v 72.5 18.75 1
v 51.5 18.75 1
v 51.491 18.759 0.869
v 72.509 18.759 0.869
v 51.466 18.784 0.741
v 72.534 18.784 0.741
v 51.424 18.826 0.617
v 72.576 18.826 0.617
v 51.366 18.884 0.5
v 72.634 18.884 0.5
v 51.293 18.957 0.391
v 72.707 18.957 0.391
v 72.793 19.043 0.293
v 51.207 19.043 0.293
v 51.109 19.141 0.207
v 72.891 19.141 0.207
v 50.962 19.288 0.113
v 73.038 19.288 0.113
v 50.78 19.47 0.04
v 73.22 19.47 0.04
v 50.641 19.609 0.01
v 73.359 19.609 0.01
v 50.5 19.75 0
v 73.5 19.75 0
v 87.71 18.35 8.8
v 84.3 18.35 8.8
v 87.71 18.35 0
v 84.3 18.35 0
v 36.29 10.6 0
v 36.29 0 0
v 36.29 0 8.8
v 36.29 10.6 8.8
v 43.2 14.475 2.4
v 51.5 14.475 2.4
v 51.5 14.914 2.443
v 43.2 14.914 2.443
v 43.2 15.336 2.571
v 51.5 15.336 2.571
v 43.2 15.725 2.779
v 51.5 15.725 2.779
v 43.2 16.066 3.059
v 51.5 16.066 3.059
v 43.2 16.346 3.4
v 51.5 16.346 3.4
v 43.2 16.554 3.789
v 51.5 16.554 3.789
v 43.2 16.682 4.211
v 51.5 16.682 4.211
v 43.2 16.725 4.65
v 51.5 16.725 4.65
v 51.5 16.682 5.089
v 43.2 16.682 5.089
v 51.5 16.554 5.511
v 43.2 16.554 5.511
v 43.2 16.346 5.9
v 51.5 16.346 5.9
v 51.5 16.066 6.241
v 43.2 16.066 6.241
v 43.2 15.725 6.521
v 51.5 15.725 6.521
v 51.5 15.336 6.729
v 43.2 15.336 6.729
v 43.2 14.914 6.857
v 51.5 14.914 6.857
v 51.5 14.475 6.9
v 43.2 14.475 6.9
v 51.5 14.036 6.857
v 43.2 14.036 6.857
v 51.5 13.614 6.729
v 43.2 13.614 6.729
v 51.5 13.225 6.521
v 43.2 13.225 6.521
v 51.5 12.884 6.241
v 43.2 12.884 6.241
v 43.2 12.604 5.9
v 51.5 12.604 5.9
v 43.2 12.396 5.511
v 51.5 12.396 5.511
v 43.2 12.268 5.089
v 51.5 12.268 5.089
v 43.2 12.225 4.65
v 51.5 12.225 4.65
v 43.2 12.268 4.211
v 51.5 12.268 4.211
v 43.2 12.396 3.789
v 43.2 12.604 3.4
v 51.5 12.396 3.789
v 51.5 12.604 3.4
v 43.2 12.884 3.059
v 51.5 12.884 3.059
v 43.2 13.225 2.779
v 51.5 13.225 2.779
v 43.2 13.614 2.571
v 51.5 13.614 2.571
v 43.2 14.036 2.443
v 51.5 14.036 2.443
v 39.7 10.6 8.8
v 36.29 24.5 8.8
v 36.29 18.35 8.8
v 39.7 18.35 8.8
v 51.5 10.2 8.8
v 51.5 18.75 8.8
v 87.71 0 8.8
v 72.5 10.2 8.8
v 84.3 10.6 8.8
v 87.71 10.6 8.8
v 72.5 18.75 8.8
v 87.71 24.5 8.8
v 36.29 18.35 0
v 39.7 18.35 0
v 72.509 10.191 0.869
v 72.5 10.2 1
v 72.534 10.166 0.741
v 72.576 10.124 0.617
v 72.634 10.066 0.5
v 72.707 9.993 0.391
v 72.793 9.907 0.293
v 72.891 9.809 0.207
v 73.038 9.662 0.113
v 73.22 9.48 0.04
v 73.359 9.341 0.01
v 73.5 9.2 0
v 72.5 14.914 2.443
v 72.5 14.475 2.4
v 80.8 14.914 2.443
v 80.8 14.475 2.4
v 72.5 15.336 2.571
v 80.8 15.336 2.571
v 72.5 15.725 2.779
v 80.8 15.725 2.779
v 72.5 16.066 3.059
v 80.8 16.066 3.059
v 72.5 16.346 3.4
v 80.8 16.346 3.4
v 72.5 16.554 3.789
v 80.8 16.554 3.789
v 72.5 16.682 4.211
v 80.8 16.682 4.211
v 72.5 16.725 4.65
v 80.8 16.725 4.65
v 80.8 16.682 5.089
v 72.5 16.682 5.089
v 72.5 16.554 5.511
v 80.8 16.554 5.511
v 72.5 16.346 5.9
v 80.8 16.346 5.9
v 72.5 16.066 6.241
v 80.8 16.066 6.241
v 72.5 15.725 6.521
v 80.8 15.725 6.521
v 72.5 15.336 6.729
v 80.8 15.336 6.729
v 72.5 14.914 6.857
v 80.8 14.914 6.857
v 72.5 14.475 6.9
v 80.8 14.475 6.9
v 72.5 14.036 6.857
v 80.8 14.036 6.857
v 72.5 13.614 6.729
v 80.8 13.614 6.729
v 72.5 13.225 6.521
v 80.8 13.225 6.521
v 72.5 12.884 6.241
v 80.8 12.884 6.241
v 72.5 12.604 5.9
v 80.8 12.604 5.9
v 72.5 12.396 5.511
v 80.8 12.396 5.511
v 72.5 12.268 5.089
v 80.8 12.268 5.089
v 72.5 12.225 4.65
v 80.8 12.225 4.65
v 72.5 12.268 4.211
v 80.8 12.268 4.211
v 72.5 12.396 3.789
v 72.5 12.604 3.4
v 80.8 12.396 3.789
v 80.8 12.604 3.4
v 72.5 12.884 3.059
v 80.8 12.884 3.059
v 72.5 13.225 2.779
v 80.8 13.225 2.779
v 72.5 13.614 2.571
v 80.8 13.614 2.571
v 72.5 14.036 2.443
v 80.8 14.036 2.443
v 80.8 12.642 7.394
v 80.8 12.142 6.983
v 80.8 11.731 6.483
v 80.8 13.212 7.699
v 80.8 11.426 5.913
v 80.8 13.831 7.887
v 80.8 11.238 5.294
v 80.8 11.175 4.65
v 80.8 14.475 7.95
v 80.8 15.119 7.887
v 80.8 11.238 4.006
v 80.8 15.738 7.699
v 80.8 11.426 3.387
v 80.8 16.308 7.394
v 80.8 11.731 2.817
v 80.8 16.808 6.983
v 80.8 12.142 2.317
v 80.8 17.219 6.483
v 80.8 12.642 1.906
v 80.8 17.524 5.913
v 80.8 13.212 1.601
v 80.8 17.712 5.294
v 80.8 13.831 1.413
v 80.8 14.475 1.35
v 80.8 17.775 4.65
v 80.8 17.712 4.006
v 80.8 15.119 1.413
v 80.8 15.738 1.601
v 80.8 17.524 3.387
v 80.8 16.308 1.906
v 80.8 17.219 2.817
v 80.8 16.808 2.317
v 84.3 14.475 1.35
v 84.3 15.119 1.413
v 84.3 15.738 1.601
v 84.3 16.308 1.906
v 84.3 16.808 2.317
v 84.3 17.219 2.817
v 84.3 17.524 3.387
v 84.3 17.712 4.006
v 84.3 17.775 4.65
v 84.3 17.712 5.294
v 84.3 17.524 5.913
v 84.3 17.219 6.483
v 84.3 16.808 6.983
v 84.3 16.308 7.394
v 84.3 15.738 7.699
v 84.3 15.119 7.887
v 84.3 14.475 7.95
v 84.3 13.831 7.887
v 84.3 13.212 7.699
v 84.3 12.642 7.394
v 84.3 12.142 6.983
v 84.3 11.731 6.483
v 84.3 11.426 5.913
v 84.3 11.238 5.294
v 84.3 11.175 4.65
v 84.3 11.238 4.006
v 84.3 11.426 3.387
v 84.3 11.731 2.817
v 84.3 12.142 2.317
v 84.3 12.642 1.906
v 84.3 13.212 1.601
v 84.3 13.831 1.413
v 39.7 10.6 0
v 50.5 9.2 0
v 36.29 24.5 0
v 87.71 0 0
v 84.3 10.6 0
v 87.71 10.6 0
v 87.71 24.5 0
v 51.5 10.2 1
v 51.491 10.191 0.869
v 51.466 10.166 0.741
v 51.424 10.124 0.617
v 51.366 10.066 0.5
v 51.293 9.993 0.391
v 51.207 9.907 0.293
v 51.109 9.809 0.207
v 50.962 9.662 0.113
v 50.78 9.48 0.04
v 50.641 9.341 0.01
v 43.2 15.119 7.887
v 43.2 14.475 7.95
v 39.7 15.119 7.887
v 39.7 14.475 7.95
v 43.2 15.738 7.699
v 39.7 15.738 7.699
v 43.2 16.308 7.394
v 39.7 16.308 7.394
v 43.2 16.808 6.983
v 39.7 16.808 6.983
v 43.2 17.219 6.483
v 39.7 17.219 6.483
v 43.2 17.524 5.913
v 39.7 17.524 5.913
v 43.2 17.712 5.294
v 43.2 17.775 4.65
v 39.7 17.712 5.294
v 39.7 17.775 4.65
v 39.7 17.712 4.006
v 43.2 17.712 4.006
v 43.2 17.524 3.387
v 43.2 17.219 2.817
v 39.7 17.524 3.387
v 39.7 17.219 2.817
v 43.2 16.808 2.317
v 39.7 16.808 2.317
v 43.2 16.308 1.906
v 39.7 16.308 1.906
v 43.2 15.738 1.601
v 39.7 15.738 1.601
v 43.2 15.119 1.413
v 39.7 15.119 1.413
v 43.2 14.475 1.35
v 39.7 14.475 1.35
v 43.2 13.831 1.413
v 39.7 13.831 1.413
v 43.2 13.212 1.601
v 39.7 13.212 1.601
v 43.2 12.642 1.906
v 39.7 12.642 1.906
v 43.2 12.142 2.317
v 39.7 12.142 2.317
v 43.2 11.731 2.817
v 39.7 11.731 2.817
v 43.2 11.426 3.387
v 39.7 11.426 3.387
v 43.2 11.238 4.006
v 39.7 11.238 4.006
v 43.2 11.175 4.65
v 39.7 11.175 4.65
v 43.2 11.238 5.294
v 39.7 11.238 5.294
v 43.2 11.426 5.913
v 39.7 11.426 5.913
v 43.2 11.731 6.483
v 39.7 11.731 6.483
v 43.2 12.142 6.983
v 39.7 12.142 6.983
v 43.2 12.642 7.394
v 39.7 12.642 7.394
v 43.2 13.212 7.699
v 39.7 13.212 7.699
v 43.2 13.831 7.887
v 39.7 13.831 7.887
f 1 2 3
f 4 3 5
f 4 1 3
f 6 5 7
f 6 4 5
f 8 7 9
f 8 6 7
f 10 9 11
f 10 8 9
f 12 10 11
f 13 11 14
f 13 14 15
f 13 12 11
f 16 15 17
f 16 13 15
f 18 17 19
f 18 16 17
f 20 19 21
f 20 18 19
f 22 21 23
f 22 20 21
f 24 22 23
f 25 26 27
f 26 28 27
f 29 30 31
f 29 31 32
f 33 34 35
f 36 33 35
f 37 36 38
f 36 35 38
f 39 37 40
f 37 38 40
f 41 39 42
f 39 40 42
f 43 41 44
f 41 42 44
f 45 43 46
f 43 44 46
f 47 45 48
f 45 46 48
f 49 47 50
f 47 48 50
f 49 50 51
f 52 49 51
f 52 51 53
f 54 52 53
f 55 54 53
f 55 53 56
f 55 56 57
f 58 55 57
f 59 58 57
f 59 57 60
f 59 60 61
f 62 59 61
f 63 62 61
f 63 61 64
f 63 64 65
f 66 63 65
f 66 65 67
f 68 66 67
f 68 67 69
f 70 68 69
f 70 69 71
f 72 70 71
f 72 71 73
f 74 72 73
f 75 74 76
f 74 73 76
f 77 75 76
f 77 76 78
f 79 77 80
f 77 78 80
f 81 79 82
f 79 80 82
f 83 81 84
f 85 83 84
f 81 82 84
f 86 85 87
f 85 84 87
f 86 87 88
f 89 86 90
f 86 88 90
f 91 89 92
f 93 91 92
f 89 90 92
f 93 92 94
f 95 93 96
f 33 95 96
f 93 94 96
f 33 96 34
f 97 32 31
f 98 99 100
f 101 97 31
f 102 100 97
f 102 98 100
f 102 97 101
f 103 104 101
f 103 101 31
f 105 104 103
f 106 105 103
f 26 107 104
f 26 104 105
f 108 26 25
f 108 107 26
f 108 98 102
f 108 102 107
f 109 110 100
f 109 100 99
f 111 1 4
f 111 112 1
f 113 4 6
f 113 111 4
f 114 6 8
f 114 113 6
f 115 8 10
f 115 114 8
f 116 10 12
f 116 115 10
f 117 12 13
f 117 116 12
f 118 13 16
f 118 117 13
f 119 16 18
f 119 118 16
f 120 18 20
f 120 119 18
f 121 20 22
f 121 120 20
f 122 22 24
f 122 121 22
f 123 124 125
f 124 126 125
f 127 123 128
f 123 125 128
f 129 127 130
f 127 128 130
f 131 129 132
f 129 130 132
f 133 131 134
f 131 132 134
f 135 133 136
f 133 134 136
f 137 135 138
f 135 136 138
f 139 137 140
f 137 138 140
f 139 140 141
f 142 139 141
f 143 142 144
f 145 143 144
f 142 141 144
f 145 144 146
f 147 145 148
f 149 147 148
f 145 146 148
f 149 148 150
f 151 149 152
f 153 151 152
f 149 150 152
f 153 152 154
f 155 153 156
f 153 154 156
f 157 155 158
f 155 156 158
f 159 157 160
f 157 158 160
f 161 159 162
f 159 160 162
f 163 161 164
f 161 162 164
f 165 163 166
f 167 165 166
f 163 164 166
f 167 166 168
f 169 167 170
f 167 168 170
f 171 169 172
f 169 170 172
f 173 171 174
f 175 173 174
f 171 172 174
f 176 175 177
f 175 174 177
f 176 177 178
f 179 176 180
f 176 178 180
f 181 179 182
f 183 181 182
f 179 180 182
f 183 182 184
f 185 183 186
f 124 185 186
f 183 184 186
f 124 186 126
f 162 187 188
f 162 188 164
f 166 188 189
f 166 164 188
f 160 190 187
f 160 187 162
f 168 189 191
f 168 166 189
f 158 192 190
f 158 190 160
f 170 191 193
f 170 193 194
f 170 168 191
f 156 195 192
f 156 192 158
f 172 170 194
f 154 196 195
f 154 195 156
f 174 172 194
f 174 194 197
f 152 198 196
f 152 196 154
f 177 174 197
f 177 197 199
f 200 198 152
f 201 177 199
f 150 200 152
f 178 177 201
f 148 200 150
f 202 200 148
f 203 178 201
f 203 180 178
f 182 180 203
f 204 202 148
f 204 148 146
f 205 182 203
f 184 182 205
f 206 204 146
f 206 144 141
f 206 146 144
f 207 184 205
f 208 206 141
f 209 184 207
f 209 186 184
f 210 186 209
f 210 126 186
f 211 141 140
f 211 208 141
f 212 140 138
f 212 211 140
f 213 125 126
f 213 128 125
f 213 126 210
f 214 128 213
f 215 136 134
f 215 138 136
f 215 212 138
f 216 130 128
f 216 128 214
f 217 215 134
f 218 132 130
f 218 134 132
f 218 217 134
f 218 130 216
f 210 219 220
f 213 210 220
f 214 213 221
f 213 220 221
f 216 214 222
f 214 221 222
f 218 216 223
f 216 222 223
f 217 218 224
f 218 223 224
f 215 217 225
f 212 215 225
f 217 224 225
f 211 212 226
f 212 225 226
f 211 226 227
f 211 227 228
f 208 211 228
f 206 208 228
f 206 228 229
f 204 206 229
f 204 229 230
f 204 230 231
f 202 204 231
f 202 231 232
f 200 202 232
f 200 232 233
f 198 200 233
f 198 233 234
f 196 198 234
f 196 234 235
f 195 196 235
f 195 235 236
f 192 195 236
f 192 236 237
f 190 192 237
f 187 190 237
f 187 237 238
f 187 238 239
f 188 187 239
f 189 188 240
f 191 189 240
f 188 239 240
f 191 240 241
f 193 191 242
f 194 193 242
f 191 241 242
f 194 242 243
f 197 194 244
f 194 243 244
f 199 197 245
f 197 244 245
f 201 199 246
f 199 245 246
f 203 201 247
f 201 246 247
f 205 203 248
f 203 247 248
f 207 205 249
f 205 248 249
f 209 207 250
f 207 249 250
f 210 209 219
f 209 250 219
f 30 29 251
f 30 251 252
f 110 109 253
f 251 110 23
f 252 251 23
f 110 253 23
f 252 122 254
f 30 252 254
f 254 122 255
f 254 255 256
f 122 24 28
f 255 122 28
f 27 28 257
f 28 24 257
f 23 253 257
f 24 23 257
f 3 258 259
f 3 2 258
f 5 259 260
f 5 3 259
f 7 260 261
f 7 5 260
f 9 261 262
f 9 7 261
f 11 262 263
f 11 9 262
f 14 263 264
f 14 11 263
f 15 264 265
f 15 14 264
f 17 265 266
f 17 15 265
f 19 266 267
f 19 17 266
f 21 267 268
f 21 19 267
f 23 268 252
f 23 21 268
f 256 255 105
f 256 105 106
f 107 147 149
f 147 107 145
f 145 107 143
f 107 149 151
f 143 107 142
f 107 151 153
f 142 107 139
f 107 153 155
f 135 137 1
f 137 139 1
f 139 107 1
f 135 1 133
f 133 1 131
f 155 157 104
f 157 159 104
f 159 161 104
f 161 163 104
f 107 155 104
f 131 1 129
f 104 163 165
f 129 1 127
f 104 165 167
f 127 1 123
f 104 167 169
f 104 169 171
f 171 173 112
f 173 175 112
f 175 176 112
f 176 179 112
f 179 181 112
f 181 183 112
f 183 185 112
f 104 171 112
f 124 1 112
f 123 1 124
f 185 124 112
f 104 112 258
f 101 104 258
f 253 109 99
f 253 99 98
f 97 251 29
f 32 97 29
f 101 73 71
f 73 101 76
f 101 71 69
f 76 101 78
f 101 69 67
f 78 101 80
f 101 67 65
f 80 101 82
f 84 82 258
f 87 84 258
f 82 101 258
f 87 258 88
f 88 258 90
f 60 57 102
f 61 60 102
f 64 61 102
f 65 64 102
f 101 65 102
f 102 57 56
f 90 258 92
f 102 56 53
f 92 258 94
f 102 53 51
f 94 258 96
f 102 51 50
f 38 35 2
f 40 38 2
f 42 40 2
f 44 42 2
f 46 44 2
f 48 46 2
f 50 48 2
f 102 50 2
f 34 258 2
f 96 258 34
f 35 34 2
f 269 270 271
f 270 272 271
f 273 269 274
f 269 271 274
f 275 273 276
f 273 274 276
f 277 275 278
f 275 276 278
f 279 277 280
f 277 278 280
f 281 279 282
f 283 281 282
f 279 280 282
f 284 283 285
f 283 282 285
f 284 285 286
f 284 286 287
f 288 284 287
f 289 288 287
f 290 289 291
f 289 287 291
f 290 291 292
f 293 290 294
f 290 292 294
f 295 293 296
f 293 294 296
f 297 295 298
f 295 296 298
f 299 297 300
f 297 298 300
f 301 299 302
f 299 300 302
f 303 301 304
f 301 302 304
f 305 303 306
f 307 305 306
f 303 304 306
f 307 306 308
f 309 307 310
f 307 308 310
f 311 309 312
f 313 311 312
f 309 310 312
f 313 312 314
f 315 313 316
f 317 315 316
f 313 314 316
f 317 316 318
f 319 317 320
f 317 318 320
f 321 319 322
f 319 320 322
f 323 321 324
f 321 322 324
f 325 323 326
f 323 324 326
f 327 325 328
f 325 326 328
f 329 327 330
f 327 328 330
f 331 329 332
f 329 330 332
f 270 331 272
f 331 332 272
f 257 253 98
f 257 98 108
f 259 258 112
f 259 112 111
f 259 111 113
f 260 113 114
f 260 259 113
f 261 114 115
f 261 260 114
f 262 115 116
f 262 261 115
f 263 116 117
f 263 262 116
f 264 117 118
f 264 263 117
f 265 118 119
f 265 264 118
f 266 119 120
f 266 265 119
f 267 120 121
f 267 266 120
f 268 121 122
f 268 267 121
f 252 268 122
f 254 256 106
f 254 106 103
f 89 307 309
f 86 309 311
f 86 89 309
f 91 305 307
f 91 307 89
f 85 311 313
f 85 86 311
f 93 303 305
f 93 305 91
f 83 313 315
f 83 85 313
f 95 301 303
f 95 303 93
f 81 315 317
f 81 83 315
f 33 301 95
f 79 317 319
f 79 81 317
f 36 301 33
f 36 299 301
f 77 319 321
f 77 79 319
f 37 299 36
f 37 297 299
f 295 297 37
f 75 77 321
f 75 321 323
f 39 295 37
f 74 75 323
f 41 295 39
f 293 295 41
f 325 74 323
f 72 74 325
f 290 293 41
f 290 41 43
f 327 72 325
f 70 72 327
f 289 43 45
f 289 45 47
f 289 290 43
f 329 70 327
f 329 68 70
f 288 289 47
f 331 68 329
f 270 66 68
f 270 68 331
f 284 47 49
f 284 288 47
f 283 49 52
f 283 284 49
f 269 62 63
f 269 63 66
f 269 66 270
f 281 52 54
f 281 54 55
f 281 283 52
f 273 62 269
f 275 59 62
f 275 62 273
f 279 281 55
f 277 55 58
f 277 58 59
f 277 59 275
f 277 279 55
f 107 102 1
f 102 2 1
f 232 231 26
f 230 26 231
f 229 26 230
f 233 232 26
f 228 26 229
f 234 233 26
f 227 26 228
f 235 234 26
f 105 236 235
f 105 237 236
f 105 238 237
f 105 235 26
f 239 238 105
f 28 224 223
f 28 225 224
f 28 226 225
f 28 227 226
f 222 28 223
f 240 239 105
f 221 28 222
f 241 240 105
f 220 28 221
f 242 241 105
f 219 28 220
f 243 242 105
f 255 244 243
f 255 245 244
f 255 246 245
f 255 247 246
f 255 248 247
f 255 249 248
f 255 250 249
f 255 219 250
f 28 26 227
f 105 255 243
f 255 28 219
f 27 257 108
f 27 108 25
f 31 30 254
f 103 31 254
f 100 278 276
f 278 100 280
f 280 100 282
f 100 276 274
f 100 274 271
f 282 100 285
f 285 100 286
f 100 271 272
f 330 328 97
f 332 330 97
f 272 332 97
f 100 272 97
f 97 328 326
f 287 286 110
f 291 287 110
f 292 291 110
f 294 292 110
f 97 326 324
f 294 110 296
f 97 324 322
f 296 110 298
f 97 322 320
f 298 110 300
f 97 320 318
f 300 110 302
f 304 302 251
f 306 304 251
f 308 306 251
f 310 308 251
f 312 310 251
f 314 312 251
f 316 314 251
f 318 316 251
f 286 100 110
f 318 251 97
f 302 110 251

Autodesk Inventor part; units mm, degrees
ref_plane "YZ Plane" through (0, 0, 0) normal (1, 0, 0) x (0, 1, 0)
ref_plane "XZ Plane" through (0, 0, 0) normal (0, 1, 0) x (-1, 0, 0)
ref_plane "XY Plane" through (0, 0, 0) normal (0, 0, 1) x (1, 0, 0)
sketch "Sketch1" plane through (0, 0, 0) normal (0, 0, 1) x (1, 0, 0)
  line L0 (51.9, 18.35) -> (51.9, 10.6) projected
  line L1 (72.1, 10.6) -> (72.1, 18.35) projected
  line L2 (51.9, 10.6) -> (72.1, 10.6) projected
  line L3 (51.9, 18.35) -> (72.1, 18.35) projected
  line L4 (0, 21.325) -> (0, 2)
  line L5 (124, 21.325) -> (124, 2)
  line L6 (51.5, 10.2) -> (51.5, 18.75)
  line L7 (51.5, 18.75) -> (72.5, 18.75)
  line L8 (72.5, 18.75) -> (72.5, 10.2)
  line L9 (72.5, 10.2) -> (51.5, 10.2)
  line L10 (51.5, 18.35) -> (39.7, 18.35)
  line L11 (39.7, 18.35) -> (39.7, 10.6)
  line L12 (39.7, 10.6) -> (51.5, 10.6)
  line L13 (62, 18.75) -> (62, 14.7524) construction
  line L14 (72.5, 18.35) -> (84.3, 18.35)
  line L15 (84.3, 18.35) -> (84.3, 10.6)
  line L16 (84.3, 10.6) -> (72.5, 10.6)
  line L17 (36.2904, 24.5) -> (87.7096, 24.5) projected
  line L18 (15.65, 0) -> (108.35, 0) projected
  line L19 (36.2904, 24.5) -> (87.7096, 24.5)
  line L20 (87.7096, 24.5) -> (87.7096, 0)
  line L21 (87.7096, 0) -> (36.2904, 0)
  line L22 (36.2904, 0) -> (36.2904, 24.5)
  line L23 (39.7, 18.35) -> (36.2904, 18.35)
  line L24 (39.7, 10.6) -> (36.2904, 10.6)
  line L25 (84.3, 10.6) -> (87.7096, 10.6)
  line L26 (84.3, 18.35) -> (87.7096, 18.35)
  point P0 (0, 0)
  dimension "d0" = 0.4
  dimension "d1" = 11.8
extrude "Extrusion1" add sketch "Sketch1" along normal up to surface (8.8 mm away) contours L9 L8 L16 L25 L20 L18 L22 L24 L12 L6 | L12 L11 L10 L6 | L10 L23 L22 L17 L20 L26 L14 L8 L7 L6 | L8 L14 L15 L16
sketch "Sketch2" plane through (84.3, 10.6, 0) normal (1, 0, 0) x (0, 0, -1)
  circle A0 centre (-4.65, 3.875) radius 2.25 projected
  point P0 (0, -10.6)
extrude "Extrusion2" cut sketch "Sketch2" against normal up to surface (44.6 mm away)
sketch "Sketch3" plane through (84.3, 10.6, 0) normal (1, 0, 0) x (0, 0, -1)
  circle A0 centre (-4.65, 3.875) radius 2.25 projected
  circle A1 centre (-4.65, 3.875) radius 3.3
  point P0 (0, -10.6)
  dimension "d6" = 6.6
extrude "Extrusion3" cut sketch "Sketch3" against normal blind 3.5 contours A0 | A1
sketch "Sketch4" plane through (39.7, 10.6, 0) normal (-1, 0, 0) x (0, 0, 1)
  circle A0 centre (4.65, 3.875) radius 2.25 projected
  circle A1 centre (4.65, 3.875) radius 3.3
  point P0 (0, -10.6)
  dimension "d9" = 6.6
extrude "Extrusion4" cut sketch "Sketch4" against normal blind 3.5 contours A0 | A1
fillet "Fillet1" radius 1 4 edges at (51.5, 14.475, 0) (72.5, 14.475, 0) (62, 18.75, 0) (62, 10.2, 0)
ref_plane "Work Plane1" through (62, 0, 39.141) normal (0, 0, -1) x (-1, 0, 0)
properties part number "Head_Baseplate"
